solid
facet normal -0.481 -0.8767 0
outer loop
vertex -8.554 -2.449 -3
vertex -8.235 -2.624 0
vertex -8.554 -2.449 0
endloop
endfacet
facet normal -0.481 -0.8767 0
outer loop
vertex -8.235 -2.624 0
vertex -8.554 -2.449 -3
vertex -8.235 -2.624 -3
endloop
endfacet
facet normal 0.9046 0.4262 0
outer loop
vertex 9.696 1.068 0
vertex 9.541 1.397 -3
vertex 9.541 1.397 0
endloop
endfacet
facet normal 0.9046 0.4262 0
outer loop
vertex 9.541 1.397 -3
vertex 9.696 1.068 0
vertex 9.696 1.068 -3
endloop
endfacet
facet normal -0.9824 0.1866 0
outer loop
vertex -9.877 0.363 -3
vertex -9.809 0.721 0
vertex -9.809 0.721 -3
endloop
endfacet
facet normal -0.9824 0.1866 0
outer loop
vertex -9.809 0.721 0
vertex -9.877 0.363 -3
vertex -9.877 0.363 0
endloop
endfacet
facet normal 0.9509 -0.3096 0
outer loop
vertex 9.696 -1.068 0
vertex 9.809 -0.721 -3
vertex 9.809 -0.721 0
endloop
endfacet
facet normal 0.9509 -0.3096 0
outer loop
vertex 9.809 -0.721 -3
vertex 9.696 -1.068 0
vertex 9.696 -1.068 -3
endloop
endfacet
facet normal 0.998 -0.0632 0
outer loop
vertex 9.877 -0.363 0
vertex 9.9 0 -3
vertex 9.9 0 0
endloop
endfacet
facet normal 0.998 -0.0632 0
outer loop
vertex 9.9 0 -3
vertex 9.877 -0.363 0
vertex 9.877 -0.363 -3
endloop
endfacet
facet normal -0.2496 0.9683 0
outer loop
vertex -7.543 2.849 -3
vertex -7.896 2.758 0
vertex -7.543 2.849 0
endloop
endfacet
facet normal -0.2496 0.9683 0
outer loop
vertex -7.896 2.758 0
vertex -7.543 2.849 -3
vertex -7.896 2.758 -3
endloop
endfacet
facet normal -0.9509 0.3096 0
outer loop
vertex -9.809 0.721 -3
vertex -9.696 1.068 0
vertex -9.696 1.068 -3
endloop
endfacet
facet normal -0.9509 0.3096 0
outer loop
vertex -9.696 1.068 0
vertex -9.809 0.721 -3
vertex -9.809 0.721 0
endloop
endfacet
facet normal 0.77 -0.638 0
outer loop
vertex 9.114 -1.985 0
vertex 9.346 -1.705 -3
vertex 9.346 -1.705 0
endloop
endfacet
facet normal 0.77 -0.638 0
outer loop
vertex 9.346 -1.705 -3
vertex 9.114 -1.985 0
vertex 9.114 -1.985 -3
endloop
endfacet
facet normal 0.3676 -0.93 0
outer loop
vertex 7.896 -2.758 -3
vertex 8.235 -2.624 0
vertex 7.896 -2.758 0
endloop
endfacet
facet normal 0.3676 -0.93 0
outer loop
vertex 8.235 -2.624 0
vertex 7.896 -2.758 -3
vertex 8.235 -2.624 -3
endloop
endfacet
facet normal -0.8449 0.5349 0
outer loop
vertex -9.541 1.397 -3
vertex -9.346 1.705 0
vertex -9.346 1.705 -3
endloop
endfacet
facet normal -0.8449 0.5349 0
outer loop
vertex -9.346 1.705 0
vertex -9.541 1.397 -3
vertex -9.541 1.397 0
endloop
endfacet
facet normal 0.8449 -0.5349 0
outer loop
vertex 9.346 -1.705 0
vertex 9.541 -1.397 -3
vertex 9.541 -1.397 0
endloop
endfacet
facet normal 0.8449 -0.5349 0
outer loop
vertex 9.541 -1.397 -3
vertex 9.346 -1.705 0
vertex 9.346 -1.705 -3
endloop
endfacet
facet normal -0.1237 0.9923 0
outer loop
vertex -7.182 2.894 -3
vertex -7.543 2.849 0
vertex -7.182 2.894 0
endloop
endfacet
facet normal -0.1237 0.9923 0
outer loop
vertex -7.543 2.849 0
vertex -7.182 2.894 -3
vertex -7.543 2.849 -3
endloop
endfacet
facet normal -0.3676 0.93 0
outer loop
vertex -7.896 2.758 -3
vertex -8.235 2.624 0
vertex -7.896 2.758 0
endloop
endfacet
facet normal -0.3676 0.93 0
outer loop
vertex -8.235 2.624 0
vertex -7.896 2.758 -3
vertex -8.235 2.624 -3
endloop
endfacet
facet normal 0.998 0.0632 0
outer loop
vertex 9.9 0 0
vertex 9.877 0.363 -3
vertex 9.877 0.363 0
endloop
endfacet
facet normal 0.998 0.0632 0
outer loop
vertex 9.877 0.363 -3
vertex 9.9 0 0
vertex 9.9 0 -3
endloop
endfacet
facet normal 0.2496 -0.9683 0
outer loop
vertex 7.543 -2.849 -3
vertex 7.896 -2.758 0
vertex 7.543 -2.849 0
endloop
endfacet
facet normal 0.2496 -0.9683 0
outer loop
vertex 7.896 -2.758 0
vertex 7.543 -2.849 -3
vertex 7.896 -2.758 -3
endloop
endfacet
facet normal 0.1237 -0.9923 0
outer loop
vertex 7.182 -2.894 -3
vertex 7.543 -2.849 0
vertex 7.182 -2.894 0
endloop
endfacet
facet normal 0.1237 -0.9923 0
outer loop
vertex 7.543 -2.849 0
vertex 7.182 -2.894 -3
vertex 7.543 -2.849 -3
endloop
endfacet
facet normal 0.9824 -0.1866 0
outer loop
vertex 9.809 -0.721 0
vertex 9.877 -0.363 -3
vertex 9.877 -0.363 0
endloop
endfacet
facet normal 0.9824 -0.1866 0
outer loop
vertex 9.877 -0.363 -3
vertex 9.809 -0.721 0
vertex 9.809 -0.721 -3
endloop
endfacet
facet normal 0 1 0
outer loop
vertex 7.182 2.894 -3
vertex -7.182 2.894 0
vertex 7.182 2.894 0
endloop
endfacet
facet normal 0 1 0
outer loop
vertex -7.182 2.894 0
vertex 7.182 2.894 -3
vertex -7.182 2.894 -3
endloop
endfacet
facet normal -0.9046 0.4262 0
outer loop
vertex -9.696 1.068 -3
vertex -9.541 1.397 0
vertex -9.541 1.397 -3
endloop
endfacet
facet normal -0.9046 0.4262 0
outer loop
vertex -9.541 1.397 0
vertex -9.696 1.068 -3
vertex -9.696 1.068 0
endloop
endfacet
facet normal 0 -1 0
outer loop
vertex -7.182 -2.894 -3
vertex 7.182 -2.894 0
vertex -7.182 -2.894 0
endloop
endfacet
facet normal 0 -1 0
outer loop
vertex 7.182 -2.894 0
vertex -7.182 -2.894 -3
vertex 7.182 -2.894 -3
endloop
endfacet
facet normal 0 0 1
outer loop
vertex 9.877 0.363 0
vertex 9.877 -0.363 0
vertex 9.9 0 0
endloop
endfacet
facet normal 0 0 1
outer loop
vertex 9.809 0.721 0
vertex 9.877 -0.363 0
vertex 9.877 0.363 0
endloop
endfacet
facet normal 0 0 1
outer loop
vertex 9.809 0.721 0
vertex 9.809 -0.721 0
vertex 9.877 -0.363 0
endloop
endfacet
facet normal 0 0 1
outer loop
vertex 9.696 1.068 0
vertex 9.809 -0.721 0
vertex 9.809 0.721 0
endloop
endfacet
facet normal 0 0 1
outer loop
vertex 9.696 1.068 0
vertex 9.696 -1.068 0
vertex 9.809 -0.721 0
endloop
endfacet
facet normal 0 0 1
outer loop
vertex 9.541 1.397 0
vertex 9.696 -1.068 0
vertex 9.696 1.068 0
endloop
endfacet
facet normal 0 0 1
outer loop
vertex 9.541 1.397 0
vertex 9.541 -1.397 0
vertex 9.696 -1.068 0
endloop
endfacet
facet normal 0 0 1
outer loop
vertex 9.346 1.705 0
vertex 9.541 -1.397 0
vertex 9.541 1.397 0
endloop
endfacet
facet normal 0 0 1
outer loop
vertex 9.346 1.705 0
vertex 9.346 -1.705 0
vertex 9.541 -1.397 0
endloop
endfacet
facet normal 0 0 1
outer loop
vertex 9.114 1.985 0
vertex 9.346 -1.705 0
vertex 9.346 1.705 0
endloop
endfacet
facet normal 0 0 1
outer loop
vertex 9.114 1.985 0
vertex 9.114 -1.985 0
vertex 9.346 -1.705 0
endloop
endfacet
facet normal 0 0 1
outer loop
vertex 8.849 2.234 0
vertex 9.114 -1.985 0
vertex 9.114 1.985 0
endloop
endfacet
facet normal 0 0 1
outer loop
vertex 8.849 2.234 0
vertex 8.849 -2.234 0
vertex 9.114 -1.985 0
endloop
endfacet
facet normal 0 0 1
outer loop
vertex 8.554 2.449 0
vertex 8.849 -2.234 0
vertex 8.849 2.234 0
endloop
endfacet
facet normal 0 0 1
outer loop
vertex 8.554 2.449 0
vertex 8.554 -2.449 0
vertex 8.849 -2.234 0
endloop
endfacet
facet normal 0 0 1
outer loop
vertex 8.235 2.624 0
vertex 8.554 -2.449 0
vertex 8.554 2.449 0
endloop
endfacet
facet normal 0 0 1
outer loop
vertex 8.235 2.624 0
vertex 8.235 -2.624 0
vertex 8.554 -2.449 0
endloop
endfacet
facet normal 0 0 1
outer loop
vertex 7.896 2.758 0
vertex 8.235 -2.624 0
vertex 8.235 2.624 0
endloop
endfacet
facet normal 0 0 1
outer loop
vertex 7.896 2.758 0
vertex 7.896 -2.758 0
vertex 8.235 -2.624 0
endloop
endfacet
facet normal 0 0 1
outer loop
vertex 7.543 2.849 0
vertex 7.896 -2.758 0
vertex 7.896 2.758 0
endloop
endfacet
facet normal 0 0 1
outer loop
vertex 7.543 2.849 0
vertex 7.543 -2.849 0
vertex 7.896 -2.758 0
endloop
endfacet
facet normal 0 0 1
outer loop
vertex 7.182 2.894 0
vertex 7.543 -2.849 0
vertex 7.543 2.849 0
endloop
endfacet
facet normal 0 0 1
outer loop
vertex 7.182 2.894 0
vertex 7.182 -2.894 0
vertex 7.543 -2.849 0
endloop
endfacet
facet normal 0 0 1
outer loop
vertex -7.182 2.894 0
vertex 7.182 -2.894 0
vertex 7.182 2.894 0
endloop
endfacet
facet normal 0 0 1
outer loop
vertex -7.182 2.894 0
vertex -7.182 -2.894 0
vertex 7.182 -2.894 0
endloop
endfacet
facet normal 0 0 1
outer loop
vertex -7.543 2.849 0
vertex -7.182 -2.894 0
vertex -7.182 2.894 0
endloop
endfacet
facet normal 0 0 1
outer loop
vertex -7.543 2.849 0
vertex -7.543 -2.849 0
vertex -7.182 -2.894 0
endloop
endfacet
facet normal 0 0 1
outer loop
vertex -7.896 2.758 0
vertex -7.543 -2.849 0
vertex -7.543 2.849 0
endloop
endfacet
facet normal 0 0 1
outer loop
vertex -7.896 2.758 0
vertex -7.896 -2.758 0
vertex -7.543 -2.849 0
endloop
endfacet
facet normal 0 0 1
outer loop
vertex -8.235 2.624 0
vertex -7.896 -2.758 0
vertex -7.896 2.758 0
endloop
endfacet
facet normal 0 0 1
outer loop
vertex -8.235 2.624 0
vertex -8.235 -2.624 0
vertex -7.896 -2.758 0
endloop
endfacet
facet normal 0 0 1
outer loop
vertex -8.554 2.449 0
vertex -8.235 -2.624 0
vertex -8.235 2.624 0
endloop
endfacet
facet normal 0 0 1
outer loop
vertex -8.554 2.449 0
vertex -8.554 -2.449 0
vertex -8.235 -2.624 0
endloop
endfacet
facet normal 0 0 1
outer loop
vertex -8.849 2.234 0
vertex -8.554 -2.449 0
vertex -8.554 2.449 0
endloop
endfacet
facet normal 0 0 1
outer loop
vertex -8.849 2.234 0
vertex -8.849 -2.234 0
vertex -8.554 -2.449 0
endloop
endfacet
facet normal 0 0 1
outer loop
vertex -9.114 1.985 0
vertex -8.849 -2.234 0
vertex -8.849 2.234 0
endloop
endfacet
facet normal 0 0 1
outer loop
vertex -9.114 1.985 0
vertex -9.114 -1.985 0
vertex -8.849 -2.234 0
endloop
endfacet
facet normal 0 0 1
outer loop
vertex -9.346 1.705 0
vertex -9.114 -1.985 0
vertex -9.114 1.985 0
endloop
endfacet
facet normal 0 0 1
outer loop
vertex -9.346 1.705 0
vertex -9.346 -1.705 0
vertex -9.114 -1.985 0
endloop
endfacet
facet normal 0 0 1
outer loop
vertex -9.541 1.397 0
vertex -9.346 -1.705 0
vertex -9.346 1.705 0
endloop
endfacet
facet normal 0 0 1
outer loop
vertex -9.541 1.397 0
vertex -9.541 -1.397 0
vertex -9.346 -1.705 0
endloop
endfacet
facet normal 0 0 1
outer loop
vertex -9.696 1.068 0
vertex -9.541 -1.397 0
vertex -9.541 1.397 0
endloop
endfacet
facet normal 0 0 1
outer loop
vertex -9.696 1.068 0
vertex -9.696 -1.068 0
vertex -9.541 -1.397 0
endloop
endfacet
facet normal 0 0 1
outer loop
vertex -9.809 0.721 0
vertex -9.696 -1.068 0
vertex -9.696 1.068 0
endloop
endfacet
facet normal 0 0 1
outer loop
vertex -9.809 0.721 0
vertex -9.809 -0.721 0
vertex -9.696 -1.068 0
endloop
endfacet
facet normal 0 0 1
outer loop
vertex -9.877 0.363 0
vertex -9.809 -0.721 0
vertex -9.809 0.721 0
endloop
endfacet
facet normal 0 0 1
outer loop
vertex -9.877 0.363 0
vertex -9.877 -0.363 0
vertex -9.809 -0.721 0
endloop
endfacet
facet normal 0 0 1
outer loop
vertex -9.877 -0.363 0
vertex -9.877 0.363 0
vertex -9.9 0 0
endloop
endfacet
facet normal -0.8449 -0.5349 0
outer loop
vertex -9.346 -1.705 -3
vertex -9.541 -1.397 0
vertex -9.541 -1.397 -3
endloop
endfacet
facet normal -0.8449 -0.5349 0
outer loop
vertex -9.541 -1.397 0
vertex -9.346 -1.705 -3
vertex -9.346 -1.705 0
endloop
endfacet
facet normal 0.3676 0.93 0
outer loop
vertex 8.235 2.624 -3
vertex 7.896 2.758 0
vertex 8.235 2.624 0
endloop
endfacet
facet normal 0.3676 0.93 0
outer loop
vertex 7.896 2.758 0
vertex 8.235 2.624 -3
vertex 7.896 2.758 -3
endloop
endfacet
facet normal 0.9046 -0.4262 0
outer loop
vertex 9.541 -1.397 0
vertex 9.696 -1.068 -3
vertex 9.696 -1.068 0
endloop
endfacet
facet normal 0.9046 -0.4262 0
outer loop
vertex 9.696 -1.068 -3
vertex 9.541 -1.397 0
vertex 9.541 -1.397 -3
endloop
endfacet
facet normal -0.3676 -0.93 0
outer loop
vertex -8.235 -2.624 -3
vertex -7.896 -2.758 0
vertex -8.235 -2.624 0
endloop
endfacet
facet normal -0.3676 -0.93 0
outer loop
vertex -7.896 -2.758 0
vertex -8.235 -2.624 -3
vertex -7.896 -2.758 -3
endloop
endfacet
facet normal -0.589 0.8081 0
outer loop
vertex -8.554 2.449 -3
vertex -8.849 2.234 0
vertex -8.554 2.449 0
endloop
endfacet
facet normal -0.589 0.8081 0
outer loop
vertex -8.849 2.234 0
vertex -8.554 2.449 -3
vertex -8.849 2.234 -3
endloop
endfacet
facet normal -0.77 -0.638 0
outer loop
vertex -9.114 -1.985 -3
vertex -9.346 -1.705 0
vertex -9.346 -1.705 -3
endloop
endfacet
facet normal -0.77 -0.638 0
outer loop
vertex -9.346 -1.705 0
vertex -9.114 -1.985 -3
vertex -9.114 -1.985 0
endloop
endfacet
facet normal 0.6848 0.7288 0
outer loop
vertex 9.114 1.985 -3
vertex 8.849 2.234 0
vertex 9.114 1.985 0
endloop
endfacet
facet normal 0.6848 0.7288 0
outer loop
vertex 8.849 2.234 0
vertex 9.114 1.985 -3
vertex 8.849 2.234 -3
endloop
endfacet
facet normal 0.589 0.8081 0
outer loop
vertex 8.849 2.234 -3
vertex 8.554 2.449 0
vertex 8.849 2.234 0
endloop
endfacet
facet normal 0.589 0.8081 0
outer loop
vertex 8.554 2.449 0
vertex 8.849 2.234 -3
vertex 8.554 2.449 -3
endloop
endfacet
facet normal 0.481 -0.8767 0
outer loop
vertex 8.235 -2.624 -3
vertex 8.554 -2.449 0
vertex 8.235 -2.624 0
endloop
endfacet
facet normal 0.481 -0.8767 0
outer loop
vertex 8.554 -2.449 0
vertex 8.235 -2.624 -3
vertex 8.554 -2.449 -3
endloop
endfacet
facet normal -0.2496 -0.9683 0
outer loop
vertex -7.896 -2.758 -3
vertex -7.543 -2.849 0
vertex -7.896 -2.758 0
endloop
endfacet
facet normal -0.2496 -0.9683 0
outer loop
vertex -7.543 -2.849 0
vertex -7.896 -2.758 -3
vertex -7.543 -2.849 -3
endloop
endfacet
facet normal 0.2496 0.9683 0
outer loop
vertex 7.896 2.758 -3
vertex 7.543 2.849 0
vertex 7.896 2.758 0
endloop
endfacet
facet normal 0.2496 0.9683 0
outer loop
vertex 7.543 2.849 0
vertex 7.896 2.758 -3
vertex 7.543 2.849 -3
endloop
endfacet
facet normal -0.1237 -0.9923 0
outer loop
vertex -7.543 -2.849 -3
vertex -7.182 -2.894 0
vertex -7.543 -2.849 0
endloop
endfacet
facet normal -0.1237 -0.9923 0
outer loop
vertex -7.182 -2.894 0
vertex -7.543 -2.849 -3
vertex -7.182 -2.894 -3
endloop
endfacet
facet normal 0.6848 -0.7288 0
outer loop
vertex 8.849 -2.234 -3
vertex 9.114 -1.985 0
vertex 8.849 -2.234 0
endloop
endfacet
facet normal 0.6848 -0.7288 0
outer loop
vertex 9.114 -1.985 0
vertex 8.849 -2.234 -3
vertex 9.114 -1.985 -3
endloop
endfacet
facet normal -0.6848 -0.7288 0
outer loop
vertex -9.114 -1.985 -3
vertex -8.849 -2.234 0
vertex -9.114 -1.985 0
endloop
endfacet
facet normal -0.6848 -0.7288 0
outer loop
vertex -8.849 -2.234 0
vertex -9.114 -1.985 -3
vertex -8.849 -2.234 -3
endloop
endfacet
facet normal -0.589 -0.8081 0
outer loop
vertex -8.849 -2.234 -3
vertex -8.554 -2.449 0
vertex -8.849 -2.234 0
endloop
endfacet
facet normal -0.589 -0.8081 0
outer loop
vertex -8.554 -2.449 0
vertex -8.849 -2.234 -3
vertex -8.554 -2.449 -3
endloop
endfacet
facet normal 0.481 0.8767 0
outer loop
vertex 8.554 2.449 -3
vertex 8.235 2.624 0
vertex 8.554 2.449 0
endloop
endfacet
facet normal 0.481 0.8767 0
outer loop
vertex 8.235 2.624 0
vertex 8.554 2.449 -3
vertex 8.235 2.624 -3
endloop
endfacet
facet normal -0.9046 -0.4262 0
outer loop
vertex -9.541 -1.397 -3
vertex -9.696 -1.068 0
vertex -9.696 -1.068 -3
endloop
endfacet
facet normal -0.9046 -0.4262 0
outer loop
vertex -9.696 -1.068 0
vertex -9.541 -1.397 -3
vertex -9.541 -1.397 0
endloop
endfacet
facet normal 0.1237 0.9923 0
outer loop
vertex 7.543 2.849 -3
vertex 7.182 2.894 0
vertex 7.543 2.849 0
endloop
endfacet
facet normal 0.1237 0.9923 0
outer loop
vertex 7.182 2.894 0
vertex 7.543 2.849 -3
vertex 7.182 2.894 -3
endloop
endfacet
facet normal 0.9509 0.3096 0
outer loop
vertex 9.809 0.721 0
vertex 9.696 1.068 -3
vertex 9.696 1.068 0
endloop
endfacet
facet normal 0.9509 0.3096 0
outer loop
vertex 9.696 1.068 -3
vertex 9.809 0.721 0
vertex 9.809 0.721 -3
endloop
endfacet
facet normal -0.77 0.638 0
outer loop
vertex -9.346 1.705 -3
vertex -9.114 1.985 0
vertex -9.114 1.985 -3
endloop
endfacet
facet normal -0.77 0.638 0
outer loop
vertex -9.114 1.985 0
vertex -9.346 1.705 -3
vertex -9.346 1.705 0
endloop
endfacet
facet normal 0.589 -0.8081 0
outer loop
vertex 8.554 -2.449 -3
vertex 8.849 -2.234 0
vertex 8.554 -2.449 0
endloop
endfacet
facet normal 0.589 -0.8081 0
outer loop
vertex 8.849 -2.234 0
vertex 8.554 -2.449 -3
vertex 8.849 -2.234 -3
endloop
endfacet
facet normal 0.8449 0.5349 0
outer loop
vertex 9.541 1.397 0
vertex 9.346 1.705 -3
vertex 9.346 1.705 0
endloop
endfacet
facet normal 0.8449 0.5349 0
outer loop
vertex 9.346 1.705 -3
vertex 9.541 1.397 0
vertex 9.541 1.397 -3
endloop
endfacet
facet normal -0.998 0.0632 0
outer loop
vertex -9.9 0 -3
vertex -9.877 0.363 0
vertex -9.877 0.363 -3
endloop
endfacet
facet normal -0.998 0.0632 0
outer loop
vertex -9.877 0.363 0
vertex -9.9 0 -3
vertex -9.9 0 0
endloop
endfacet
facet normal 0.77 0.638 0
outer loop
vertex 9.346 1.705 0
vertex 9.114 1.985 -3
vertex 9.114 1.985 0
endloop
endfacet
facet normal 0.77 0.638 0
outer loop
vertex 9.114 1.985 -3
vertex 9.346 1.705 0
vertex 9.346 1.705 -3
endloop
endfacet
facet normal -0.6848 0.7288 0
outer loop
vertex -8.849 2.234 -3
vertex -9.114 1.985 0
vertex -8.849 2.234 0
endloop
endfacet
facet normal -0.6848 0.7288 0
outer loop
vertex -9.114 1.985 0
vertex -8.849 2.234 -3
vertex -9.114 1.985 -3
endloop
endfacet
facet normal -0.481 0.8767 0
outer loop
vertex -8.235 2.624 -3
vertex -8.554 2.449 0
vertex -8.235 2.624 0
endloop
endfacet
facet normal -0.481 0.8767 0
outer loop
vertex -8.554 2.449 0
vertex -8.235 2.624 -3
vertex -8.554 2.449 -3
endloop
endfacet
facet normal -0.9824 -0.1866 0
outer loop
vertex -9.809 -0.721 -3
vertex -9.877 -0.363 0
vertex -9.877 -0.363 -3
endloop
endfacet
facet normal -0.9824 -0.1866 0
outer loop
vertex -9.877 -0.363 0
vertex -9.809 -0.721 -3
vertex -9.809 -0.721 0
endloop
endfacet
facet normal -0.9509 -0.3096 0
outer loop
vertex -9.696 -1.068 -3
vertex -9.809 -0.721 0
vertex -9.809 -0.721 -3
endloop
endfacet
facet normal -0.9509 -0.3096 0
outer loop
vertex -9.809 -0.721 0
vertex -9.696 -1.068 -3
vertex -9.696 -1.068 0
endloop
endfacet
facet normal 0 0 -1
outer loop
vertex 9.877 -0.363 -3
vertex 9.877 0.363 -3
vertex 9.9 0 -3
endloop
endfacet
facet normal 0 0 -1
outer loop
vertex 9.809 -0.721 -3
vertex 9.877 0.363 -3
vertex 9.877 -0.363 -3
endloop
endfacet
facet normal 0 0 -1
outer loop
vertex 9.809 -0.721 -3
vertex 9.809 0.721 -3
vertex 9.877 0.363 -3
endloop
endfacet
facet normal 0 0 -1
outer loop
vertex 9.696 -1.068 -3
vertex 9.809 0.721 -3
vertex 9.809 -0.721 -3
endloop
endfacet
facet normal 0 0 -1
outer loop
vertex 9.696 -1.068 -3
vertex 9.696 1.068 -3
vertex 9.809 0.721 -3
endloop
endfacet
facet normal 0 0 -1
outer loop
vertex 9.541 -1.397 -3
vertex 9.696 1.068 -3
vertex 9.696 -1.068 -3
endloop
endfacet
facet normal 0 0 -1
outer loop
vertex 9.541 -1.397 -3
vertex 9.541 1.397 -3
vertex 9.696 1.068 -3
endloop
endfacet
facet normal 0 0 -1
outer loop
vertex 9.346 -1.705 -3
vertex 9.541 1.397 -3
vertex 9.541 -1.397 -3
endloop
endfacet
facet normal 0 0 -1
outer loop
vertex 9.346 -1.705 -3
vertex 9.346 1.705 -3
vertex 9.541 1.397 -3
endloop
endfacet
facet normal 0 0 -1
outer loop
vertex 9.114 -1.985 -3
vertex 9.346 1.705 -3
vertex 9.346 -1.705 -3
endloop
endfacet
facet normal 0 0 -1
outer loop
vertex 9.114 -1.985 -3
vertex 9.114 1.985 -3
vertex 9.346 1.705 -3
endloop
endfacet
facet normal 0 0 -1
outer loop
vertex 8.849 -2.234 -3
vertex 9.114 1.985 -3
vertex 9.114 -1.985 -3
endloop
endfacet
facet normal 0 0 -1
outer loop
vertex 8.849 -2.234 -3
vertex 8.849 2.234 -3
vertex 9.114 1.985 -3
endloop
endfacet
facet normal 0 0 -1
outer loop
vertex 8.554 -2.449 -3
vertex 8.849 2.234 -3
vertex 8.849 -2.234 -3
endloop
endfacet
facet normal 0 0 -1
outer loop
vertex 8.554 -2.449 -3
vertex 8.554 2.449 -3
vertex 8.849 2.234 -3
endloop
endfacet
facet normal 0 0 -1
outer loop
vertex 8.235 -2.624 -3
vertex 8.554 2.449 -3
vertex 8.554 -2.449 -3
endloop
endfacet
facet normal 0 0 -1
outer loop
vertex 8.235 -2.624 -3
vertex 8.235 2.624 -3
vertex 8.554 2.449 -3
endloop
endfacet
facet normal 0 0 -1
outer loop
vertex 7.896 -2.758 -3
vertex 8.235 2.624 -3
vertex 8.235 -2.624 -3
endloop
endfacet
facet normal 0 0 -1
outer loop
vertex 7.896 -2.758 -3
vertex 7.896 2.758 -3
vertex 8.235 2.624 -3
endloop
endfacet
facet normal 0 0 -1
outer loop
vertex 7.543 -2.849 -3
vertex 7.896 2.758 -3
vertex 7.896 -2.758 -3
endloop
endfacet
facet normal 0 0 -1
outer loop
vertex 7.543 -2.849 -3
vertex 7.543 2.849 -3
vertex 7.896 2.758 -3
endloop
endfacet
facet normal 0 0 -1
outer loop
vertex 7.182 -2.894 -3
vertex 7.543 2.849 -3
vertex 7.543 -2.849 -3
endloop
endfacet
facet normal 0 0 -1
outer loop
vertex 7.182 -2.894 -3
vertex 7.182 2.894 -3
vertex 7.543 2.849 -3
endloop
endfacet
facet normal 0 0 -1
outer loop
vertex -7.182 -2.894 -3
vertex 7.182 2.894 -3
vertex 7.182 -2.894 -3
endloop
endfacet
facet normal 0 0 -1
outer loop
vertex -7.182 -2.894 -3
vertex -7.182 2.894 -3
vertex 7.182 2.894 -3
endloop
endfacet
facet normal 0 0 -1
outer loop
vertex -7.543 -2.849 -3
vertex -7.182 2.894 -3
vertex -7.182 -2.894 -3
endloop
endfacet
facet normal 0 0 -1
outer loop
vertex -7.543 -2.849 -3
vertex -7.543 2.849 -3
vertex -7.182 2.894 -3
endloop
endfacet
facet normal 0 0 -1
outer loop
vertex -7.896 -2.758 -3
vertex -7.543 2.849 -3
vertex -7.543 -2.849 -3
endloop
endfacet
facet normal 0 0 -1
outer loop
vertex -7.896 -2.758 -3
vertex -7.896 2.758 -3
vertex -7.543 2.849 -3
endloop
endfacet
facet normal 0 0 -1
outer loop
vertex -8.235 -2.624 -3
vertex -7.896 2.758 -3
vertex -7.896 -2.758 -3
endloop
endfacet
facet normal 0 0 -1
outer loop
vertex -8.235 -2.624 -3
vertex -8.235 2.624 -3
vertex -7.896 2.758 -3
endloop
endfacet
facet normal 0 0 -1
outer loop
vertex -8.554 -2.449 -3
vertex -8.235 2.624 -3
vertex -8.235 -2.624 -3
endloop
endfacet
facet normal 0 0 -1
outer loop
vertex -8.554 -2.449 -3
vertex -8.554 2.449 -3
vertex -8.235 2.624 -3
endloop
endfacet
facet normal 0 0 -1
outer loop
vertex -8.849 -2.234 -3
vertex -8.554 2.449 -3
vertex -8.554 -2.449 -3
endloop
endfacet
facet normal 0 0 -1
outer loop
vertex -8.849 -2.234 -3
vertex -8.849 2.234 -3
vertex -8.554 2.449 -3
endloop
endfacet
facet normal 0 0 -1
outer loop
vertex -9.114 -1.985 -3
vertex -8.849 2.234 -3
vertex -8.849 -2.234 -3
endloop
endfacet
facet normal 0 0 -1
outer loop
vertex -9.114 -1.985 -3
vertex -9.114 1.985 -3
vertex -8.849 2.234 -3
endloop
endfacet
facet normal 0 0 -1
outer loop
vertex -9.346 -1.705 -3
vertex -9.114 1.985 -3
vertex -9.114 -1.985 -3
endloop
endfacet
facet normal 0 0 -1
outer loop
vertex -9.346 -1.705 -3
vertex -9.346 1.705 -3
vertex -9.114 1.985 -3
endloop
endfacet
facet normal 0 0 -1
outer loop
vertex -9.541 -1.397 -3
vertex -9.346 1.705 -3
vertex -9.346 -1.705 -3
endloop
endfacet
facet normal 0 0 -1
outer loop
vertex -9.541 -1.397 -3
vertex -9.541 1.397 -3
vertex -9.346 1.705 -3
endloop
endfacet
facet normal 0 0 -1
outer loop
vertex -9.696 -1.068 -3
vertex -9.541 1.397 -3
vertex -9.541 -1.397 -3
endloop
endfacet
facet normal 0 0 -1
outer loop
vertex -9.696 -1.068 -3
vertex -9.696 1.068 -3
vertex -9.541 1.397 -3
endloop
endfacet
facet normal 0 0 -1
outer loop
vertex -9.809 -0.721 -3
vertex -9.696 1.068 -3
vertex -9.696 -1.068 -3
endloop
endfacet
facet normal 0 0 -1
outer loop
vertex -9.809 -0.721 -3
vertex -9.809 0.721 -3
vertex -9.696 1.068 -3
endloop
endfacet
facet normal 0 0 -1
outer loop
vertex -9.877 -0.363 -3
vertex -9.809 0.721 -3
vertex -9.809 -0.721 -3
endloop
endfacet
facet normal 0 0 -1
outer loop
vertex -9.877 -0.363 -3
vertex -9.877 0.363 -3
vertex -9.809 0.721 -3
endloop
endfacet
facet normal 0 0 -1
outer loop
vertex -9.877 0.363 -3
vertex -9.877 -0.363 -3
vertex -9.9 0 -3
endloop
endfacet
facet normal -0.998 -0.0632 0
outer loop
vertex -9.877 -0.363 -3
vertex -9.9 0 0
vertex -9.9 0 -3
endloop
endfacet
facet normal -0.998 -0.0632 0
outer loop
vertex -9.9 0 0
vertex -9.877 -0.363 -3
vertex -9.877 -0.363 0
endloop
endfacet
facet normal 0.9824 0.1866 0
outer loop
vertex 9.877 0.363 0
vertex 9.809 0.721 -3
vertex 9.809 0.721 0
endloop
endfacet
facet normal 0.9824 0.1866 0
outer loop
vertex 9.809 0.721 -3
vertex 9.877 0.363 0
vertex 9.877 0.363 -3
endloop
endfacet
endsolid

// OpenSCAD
$fn = 50;

difference() {
	union() {
		translate(v = [0, 0, 0]) {
			rotate(a = [0, 0, 0]) {
				difference() {
					union() {
						translate(v = [0, 0, 0]) {
							rotate(a = [0, 0, 0]) {
								hull() {
									difference() {
										union() {
											translate(v = [-7.0, 0, 0]) {
												rotate(a = [0, 0, 0]) {
													difference() {
														union() {
															translate(v = [0, 0, -3]) {
																cylinder(h = 3, r = 2.9);
															}
														}
														union();
													}
												}
											}
											translate(v = [7.0, 0, 0]) {
												rotate(a = [0, 0, 0]) {
													difference() {
														union() {
															translate(v = [0, 0, -3]) {
																cylinder(h = 3, r = 2.9);
															}
														}
														union();
													}
												}
											}
										}
										union();
									}
								}
							}
						}
					}
					union();
				}
			}
		}
	}
	union();
}
